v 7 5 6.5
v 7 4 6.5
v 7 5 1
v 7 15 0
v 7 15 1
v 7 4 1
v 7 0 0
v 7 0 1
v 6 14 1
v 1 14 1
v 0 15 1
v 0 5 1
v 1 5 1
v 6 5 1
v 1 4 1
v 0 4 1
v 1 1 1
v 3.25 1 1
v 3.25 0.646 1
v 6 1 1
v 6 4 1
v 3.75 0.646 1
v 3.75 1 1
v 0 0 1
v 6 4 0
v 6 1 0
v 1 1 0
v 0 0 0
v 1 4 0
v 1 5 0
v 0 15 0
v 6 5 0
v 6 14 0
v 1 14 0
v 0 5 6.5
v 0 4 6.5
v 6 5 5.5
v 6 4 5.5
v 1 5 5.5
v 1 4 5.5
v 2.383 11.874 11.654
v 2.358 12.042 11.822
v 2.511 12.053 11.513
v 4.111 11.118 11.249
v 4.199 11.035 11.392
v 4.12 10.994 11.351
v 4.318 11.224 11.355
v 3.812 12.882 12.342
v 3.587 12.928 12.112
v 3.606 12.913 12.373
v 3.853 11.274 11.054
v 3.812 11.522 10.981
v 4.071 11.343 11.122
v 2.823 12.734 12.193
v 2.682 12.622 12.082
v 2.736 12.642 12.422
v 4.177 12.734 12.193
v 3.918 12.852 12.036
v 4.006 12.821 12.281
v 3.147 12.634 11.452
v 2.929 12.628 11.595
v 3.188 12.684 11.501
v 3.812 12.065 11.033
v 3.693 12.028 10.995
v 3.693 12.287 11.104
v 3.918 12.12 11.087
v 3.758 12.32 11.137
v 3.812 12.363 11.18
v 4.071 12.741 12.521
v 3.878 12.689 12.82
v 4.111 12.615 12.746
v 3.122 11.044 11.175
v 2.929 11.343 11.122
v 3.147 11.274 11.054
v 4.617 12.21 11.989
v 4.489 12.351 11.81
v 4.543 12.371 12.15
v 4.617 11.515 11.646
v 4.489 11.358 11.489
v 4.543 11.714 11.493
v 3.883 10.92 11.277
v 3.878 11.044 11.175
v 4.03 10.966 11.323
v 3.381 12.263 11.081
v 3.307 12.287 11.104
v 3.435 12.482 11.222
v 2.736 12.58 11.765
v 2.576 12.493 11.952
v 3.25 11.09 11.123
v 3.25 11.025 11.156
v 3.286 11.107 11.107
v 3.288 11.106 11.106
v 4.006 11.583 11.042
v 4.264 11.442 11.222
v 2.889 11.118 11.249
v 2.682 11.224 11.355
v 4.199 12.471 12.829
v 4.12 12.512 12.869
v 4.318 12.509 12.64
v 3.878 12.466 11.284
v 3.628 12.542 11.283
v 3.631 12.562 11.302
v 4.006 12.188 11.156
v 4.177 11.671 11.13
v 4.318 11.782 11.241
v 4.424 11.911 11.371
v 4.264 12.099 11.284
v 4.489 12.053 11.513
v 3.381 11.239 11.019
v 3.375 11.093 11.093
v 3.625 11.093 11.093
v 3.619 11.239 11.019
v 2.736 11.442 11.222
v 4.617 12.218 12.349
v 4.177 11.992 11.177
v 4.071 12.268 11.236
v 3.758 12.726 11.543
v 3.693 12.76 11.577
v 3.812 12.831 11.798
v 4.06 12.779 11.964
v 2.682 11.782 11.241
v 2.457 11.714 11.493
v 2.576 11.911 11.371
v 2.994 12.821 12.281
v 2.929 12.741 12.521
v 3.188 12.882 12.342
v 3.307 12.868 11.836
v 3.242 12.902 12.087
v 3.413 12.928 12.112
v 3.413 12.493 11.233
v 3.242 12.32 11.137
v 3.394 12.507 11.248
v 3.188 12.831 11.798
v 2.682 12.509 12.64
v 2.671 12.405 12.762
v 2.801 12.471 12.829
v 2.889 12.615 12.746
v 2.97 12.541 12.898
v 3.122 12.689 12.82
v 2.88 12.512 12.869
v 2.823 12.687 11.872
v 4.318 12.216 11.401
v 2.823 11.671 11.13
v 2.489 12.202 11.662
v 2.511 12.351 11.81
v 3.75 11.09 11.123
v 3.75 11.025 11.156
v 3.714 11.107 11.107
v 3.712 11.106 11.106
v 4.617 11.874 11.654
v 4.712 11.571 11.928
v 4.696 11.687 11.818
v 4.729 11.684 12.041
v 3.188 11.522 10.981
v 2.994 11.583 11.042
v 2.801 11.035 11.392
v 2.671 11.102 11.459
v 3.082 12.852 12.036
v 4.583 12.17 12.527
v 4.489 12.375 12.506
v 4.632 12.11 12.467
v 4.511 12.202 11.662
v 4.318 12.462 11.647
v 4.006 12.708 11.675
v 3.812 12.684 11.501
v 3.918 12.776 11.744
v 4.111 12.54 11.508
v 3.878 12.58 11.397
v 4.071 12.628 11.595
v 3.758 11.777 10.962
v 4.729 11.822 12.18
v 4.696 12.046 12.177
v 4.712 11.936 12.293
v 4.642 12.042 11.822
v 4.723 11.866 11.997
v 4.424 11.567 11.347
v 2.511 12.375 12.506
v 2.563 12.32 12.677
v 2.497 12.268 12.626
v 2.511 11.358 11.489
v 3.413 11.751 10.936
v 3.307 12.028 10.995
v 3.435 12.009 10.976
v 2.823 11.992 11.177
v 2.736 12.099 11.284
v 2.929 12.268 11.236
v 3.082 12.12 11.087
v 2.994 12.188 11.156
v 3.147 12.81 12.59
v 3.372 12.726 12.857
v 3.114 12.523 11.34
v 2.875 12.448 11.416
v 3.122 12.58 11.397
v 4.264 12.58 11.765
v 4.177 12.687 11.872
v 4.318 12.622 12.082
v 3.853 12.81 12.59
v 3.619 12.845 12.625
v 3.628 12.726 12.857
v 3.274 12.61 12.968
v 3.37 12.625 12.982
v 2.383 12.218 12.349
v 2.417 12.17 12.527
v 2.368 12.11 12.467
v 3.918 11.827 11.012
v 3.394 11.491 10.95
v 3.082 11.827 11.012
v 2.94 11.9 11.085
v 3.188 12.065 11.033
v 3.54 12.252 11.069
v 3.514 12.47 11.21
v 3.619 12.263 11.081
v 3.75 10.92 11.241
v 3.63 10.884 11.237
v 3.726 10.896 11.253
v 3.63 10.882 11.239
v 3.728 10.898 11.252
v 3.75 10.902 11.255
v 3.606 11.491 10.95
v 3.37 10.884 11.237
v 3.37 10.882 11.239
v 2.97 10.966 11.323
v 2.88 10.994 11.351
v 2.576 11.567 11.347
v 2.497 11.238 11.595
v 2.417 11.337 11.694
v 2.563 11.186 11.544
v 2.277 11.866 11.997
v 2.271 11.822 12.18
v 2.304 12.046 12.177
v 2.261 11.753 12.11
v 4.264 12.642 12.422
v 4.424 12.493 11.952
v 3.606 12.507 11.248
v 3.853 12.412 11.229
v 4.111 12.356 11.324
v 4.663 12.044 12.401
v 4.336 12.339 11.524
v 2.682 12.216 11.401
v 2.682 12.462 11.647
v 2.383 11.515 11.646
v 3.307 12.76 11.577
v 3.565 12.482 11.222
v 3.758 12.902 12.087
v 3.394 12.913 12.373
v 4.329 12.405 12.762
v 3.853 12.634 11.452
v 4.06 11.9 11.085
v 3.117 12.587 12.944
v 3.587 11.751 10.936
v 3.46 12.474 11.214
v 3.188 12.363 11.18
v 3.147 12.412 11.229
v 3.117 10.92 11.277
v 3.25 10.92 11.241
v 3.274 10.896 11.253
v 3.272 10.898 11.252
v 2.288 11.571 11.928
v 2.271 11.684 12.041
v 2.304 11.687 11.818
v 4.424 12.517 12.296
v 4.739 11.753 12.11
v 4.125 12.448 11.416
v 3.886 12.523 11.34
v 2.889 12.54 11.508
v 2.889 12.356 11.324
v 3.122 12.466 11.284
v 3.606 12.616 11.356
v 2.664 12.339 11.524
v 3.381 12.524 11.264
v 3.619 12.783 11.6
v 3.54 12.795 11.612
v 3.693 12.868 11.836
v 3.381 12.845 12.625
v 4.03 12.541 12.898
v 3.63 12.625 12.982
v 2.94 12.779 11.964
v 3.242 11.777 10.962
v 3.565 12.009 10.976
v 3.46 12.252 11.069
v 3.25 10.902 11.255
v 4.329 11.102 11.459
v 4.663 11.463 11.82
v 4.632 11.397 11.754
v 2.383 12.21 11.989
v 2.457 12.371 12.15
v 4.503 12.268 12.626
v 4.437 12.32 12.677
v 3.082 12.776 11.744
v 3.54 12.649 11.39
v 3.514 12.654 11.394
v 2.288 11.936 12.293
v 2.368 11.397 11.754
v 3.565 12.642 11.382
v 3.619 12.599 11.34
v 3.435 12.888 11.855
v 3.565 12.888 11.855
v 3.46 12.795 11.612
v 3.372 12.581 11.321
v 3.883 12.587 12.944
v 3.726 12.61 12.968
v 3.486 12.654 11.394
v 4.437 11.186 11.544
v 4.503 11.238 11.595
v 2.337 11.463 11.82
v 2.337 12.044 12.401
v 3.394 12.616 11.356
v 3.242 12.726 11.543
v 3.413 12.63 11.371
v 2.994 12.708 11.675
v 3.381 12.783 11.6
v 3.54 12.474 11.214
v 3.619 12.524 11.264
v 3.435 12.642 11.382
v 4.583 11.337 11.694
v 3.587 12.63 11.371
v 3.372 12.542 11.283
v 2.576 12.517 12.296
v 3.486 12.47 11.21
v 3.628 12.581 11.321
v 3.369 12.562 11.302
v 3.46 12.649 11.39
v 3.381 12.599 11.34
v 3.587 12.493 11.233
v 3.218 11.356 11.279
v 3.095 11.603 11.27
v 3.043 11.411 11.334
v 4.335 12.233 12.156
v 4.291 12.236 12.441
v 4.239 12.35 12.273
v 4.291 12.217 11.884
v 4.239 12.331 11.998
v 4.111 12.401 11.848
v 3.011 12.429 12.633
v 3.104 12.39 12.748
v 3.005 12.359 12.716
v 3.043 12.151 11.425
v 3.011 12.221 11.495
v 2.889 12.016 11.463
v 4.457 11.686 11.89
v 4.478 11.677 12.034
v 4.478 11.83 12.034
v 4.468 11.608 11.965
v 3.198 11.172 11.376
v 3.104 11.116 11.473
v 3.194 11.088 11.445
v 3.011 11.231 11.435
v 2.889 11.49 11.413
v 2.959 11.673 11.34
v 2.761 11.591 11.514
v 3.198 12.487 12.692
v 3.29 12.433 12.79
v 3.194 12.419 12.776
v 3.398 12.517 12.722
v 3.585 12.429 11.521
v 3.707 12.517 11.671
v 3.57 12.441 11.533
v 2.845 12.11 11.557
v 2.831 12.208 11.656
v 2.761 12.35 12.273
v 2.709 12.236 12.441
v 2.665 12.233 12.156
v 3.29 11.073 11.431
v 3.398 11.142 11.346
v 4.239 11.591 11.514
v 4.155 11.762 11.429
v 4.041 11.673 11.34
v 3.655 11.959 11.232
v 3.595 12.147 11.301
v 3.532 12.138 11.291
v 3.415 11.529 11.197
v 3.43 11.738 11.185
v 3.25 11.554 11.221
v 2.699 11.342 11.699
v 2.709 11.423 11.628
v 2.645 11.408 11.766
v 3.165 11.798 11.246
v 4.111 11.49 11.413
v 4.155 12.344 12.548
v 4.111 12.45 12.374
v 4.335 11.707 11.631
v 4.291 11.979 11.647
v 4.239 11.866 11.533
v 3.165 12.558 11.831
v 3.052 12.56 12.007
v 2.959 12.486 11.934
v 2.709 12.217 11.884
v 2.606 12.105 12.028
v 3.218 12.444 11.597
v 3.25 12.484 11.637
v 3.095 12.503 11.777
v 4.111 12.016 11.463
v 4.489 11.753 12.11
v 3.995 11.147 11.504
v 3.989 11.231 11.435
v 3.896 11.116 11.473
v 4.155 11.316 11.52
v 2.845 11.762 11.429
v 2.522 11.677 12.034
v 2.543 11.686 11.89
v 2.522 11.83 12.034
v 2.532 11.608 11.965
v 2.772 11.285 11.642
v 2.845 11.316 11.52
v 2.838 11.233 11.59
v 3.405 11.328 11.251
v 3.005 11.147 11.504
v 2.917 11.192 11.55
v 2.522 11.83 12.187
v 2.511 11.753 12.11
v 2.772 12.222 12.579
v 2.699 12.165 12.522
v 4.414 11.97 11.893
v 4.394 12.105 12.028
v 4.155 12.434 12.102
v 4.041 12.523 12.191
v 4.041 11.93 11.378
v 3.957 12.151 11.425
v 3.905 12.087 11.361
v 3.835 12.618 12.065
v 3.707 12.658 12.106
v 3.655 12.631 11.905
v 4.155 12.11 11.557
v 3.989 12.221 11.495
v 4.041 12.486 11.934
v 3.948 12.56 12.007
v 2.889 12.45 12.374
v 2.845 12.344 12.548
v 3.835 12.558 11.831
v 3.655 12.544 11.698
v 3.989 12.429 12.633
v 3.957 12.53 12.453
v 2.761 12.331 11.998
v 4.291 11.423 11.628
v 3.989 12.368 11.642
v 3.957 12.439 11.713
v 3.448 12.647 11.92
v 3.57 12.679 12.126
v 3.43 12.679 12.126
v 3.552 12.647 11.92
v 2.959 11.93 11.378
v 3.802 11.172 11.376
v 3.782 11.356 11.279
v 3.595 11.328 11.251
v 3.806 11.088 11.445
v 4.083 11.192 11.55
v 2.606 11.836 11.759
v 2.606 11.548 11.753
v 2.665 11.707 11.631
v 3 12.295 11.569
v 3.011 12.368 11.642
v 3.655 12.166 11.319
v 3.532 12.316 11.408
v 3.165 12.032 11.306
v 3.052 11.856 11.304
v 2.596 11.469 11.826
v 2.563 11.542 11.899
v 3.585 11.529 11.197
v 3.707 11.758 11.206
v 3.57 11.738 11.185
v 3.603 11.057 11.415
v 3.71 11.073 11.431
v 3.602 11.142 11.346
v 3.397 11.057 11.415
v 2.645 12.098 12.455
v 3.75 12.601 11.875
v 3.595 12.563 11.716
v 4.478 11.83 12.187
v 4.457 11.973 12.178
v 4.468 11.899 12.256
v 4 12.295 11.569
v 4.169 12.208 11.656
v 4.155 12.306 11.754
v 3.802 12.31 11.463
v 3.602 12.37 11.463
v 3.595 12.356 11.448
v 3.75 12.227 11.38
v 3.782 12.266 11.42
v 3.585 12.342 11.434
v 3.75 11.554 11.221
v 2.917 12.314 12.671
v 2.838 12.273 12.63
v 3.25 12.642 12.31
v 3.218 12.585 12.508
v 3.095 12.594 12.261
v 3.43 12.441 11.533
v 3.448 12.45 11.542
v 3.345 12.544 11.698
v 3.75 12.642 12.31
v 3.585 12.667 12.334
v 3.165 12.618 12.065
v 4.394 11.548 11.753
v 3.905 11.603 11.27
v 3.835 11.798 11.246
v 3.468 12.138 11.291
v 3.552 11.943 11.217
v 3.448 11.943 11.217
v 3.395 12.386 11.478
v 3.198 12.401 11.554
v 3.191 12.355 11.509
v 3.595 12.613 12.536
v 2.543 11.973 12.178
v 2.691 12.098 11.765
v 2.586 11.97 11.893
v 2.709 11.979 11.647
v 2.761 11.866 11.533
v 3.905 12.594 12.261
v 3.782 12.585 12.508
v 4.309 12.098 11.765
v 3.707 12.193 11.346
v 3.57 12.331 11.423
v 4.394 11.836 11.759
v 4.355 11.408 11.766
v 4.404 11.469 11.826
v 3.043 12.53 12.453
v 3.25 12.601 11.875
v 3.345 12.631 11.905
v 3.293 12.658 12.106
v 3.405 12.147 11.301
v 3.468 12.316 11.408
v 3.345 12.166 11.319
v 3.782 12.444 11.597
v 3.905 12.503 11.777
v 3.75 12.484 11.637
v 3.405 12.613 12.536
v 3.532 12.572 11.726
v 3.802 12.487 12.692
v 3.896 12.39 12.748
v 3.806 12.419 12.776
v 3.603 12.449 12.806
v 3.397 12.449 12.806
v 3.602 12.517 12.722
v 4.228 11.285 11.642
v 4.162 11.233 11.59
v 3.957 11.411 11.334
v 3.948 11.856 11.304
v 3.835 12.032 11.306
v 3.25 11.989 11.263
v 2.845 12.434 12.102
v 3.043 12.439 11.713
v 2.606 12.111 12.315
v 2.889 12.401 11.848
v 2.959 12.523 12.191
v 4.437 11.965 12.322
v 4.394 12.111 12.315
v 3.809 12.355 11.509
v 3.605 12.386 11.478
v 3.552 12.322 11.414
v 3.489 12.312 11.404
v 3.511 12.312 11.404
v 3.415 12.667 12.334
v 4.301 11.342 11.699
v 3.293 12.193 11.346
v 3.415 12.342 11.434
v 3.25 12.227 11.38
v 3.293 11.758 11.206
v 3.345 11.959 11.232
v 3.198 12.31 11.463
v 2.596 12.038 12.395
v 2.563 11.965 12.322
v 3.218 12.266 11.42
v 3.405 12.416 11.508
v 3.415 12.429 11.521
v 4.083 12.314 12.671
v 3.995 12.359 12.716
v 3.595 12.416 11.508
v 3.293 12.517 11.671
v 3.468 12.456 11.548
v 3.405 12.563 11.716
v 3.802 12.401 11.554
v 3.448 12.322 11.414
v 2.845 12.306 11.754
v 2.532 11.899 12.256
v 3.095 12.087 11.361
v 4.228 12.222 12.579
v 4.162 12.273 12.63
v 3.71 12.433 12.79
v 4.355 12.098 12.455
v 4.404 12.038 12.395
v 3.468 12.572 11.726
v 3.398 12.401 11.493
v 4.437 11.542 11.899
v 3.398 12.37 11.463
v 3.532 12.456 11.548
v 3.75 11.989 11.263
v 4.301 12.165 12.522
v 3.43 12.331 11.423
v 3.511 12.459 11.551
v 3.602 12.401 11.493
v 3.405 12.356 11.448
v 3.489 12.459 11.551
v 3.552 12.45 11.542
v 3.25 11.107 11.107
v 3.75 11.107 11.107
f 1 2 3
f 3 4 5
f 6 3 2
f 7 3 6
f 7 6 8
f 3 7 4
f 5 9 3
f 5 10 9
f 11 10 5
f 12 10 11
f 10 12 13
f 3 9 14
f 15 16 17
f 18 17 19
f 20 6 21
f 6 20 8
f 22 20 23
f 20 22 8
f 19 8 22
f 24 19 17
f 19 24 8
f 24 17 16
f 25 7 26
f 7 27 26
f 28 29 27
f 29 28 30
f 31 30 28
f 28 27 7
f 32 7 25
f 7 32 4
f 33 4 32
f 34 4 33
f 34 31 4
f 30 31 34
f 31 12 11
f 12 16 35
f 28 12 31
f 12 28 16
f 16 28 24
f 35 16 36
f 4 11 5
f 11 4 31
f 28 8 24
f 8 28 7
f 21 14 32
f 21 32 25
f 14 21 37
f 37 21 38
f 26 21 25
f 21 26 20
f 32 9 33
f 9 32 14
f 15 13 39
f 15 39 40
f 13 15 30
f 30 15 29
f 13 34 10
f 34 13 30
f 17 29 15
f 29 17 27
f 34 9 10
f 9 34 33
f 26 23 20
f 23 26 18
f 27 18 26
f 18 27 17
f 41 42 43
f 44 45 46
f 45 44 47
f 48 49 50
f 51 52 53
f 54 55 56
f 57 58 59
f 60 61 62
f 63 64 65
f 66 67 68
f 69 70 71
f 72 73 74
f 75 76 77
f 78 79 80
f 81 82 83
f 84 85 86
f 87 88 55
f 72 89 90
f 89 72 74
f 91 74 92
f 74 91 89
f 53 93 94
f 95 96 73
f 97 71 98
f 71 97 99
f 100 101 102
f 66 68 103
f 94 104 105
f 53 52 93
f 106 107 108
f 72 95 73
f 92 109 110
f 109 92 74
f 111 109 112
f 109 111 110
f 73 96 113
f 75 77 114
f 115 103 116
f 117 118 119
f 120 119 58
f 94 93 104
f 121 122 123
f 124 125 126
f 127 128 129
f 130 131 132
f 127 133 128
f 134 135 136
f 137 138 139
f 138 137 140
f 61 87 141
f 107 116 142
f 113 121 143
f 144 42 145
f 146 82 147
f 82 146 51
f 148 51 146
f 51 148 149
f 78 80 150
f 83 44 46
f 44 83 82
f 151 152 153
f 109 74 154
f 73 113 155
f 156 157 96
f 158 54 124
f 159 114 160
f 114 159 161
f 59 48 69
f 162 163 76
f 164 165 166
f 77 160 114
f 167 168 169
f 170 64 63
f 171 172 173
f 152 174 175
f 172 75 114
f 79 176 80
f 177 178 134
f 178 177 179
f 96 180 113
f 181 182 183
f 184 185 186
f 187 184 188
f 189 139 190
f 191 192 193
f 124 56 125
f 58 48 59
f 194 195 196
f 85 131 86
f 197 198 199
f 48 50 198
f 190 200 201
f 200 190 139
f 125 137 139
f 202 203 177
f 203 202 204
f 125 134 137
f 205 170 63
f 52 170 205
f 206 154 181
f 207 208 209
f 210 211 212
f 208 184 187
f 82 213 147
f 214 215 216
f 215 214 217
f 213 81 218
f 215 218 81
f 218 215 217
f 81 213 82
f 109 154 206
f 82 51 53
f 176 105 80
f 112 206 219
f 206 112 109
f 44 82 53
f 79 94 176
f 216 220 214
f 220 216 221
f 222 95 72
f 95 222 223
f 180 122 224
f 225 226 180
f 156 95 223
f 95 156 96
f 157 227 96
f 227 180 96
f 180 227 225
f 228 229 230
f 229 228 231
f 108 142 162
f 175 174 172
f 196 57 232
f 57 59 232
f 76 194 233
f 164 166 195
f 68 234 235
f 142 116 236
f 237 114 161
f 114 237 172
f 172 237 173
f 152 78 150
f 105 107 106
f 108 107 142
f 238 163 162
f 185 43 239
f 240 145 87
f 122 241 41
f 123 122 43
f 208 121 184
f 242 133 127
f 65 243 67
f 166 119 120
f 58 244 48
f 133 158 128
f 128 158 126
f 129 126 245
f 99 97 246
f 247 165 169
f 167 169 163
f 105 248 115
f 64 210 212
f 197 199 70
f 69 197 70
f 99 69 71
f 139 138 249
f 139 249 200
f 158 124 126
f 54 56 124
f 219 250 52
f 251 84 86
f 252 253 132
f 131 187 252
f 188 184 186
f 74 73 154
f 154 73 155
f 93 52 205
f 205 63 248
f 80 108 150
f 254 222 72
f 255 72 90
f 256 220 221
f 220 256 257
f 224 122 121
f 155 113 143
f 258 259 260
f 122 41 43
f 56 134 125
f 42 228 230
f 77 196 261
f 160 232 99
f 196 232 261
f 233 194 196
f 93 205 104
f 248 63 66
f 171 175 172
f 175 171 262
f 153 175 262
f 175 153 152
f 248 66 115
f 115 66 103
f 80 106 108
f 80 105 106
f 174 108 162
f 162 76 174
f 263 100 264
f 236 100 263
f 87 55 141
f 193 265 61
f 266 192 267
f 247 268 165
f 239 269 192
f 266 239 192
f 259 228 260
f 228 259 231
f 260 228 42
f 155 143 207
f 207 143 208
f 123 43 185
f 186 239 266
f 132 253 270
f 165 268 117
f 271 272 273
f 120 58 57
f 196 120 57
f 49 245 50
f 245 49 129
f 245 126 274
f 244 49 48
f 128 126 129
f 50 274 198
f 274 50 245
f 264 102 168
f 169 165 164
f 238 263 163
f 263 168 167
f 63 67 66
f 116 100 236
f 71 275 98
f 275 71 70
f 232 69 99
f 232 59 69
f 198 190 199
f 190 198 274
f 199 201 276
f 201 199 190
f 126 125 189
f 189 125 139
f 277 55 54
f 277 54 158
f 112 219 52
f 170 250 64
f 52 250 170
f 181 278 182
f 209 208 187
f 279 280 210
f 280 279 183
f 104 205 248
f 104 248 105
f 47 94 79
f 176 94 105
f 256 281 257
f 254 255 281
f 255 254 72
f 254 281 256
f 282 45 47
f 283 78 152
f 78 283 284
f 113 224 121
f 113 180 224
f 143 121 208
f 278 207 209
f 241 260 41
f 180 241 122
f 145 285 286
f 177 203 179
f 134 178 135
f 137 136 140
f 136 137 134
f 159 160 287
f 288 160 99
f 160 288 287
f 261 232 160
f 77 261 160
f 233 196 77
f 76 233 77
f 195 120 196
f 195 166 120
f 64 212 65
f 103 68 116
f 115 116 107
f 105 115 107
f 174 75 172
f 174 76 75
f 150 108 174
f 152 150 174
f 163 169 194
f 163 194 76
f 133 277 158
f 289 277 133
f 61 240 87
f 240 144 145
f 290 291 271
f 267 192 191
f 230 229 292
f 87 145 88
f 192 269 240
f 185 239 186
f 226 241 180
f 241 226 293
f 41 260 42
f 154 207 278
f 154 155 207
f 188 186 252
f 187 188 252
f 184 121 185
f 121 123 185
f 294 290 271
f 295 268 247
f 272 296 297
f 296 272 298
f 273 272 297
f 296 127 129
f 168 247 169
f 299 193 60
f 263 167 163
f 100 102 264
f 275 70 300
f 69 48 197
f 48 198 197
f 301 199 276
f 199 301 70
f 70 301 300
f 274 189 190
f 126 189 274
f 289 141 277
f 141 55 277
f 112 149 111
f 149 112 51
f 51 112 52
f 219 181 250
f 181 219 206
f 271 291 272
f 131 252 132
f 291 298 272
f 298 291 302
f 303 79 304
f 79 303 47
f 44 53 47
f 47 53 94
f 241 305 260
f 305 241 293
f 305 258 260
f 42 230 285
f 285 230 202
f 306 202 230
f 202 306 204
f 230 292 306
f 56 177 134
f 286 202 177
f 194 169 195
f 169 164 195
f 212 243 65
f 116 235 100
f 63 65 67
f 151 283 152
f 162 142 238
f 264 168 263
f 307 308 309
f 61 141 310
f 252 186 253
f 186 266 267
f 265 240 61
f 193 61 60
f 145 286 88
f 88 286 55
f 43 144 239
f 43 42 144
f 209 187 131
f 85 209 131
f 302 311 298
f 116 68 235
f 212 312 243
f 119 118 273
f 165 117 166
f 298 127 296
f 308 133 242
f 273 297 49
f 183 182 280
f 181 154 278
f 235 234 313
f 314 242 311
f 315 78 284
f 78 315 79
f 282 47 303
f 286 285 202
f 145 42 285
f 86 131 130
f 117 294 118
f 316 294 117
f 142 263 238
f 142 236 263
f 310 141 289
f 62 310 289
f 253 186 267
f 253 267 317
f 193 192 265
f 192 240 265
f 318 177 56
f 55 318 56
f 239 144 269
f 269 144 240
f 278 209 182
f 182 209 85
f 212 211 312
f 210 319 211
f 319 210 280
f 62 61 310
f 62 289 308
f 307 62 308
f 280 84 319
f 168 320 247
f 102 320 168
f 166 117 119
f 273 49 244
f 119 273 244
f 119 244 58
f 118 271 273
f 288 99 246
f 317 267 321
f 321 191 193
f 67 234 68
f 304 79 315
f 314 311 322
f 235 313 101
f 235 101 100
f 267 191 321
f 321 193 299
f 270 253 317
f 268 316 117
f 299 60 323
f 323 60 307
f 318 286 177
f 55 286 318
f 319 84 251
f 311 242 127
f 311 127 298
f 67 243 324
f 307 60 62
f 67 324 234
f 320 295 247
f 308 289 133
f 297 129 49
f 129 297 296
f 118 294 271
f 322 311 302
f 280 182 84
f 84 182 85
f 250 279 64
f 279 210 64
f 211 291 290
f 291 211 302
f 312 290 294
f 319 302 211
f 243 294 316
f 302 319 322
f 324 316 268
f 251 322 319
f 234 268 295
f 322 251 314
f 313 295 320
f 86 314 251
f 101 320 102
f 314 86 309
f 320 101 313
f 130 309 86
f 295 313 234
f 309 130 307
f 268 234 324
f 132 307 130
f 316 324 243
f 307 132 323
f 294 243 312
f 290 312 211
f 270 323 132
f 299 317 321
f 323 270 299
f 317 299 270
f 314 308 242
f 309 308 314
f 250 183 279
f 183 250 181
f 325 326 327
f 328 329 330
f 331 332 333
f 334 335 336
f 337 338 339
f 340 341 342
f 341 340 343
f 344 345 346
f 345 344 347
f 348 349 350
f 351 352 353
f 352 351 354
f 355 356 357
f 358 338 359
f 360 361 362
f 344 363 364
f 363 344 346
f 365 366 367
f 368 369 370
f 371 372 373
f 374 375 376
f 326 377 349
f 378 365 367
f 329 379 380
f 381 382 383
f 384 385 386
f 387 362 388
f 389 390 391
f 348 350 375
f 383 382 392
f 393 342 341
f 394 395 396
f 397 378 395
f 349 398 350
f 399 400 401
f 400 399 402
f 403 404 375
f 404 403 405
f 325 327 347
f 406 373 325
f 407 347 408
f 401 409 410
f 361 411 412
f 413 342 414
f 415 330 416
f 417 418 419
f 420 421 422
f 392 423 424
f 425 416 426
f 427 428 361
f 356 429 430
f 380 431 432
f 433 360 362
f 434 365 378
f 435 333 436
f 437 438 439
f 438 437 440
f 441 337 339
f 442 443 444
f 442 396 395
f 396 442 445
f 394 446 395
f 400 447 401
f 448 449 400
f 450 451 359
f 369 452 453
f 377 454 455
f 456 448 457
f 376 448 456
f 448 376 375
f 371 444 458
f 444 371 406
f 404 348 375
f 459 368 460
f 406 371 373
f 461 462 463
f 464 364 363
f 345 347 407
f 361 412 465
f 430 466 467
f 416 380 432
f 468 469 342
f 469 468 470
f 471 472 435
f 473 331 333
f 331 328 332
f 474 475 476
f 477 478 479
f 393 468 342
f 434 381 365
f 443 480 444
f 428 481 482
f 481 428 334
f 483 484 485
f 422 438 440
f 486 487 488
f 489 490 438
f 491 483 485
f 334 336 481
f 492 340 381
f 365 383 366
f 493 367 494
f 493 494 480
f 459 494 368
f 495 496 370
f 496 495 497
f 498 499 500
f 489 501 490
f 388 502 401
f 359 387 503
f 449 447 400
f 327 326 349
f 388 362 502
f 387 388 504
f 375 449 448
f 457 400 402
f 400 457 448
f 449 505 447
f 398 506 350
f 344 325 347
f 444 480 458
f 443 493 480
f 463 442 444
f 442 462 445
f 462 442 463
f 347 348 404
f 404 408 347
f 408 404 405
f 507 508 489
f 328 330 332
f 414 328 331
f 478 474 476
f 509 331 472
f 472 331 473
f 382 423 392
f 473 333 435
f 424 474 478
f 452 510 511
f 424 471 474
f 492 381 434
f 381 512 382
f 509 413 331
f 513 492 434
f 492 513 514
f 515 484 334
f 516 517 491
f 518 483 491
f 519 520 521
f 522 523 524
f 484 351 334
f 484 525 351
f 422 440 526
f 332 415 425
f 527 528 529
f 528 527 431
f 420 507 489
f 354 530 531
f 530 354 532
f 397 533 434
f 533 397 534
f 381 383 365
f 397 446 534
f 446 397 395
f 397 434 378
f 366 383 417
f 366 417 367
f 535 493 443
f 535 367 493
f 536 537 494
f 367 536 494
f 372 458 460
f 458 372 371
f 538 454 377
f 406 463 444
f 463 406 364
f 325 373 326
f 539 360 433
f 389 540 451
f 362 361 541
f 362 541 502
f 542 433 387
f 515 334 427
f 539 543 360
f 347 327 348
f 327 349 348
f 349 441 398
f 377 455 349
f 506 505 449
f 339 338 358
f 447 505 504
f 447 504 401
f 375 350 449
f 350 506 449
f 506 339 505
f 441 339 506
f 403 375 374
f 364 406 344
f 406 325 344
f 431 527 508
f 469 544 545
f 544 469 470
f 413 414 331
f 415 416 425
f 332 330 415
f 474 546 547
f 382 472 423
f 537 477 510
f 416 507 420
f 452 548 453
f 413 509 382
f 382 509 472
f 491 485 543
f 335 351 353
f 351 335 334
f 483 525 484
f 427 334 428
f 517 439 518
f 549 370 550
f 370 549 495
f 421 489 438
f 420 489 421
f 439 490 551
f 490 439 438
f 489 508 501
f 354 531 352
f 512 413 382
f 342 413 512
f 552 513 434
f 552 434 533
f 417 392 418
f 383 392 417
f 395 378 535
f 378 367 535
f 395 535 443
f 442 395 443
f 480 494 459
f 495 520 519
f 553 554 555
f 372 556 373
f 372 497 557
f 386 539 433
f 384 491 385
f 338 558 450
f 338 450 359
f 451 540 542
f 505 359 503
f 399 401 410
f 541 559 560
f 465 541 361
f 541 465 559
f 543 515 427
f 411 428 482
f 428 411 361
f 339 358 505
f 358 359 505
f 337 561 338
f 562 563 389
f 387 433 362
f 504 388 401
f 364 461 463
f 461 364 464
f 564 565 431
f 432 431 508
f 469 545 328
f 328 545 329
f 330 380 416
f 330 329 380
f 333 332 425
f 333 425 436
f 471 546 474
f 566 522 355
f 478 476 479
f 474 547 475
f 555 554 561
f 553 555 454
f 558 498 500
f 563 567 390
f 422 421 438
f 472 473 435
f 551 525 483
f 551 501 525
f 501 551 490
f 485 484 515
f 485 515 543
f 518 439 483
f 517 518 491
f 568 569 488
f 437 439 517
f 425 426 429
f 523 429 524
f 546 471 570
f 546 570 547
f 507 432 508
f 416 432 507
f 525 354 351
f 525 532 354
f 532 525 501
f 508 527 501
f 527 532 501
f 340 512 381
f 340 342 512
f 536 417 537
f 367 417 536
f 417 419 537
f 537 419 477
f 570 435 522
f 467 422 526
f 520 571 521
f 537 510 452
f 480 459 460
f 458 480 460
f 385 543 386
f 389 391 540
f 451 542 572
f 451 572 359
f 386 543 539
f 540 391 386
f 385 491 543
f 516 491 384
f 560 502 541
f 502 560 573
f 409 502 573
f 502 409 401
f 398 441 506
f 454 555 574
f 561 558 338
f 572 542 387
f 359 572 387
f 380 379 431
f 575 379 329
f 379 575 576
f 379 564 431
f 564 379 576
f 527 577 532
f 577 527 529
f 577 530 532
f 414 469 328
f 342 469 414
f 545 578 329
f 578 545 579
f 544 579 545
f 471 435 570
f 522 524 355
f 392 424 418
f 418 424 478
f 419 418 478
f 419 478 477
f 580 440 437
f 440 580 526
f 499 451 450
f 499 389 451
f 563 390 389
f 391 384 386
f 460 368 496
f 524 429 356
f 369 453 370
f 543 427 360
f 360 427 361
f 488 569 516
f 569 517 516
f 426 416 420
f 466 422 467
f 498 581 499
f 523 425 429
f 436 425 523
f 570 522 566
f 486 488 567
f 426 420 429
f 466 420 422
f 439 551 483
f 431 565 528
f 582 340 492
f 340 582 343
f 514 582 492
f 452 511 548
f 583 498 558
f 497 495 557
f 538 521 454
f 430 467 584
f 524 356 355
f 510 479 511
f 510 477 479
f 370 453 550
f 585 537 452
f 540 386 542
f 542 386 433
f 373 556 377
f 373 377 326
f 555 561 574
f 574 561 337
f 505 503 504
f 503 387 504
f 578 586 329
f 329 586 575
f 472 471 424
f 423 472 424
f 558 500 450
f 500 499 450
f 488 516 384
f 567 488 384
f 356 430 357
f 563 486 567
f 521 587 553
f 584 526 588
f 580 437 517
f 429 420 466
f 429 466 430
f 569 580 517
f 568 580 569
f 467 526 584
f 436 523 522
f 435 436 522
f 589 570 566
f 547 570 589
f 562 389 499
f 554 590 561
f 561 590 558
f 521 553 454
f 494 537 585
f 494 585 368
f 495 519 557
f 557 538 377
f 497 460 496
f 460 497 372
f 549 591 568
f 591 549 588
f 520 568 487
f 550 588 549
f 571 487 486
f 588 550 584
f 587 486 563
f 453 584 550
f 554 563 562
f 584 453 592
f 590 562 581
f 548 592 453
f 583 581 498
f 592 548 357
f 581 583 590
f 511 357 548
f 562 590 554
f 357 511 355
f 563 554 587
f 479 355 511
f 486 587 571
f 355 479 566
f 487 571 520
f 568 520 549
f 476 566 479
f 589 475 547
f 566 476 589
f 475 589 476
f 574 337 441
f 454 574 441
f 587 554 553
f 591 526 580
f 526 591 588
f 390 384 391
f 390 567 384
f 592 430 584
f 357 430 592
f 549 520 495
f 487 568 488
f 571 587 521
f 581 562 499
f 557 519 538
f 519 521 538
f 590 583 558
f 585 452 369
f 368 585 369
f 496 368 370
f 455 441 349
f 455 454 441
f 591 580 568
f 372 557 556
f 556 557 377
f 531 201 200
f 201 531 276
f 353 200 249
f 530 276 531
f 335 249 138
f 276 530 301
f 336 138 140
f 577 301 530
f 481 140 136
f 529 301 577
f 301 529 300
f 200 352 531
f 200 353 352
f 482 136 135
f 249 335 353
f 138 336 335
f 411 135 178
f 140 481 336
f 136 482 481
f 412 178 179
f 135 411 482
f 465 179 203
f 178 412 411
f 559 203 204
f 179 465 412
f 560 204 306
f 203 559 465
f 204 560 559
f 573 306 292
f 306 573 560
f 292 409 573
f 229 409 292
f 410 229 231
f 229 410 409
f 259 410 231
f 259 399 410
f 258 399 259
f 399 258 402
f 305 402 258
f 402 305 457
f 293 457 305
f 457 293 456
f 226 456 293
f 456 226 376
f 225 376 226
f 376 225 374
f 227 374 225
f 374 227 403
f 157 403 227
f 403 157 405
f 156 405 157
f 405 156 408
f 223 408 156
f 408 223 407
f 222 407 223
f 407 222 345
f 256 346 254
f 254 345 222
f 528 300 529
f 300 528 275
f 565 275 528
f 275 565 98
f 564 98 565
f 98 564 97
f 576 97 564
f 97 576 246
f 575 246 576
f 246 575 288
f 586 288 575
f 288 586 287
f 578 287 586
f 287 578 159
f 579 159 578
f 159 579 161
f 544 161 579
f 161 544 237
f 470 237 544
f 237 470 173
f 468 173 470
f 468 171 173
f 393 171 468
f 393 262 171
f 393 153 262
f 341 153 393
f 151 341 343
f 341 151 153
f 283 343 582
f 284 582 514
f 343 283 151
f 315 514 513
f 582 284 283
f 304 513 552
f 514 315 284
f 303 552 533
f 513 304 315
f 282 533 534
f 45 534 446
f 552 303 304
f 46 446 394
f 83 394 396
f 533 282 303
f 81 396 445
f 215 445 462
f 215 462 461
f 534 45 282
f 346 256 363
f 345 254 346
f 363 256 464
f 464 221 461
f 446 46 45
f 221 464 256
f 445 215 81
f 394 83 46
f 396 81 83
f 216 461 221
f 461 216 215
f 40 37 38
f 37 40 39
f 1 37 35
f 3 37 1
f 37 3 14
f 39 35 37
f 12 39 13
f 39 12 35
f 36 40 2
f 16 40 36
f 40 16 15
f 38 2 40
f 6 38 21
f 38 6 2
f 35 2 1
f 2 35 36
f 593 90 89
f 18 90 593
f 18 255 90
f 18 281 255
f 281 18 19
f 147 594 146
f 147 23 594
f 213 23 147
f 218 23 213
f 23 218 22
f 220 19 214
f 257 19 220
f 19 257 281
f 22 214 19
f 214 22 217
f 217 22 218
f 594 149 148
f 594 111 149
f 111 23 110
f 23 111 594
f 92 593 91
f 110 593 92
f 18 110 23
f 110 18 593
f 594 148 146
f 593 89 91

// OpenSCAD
// model of a catapult with as many customizable parameters as possible to allow for various trajectory experiments in a physics demo

//************************************************************
//PARAMETERS
//************************************************************
// Base width
baseWidth = 7; //[5:30]
// Base length
baseLength = 15; //[5:30]
// Base height
baseHeight = 1; //[0.5:1]
// Base thickness
baseThick = 1; //[0.5:1]
// Arm length
armLength = 15; //[5:50]
// Arm width
armWidth = 0.5; //[0.25:3]
// Arm thickness
armThick = 0.25; //[0.25:1]
// Arm angle
angle = 45; //[5:90]
// Radius of bucket
bucketRad = 1; //[0.25:10]
// Bucket thickness
bucketThick = 0.25; //[0.25:1]
// Crossbar height (set to 0 if you don't want a crossbar)
barHeight = 5.5; //[0:40]
// Crossbar distance from front
barY = 4; //[0:20]
// Front support length (may be needed to prevent front flips)
suppLength = 0; //[0:15]

//************************************************************
//MATH
//************************************************************
holeWidth = baseWidth - (2*baseThick);
holeLength = baseLength - (2*baseThick);
holeHeight = baseHeight + 2;

armX = (baseWidth - armWidth)/2;
armY = baseThick/2;
armZ = baseHeight/2;

bucketX = baseWidth/2;
bucketY = ((baseThick/2) + ((armLength + bucketRad + bucketThick - armThick)*cos(angle)) - (armThick*sin(angle))) * 1.01;
bucketZ = ((baseHeight/2) + ((armLength + bucketRad + bucketThick - armThick)*sin(angle)) + (armThick*cos(angle))) * 1.01;

//************************************************************
//RENDERS
//************************************************************
$fn = 30;

// translate cube up to x-y plane to make printers happy
//translate([0,0,baseHeight/2]){
	catapult();
//}

//************************************************************
//MODULES
//************************************************************
module catapult(){
    union(){
        base();
        arm();
        bucket();
        if(barHeight != 0){
            crossbar();
        }
        if(suppLength != 0){
            support();
        }
    }
}

module base(){
    difference(){
        cube([baseWidth,baseLength,baseHeight],false);
        translate([baseThick,baseThick,-1]){
            cube([holeWidth,holeLength,holeHeight],false);        
        }
    }
}

module arm(){
    translate([armX,armY,armZ]){
        rotate([angle,0,0]){
            cube([armWidth,armLength,armThick],false);
        }
    }
}

module bucket(){
    translate([bucketX,bucketY,bucketZ]){
        rotate([angle,0,0]){
            translate([0,0,bucketRad*0.1]){
                difference(){
                    sphere(bucketRad+bucketThick);
                    sphere(bucketRad);
                    translate([0,0,(bucketRad*1.5)-(bucketRad*0.1)]){
                        cube([(bucketRad+1)*3,(bucketRad+1)*3,bucketRad*3],true);
                    }
                }
            }
        }
    }
}

module crossbar(){
    translate([0,barY,0]){
        cube([baseThick,baseThick,barHeight]);
    }
    translate([baseWidth-baseThick,barY,0]){
        cube([baseThick,baseThick,barHeight]);
    }
    translate([0,barY,barHeight]){
        cube([baseWidth,baseThick,baseThick]);
    }
}

module support(){
    translate([0,-suppLength,0]){
        cube([baseThick,suppLength,baseHeight]);
    }
    translate([baseWidth-baseThick,-suppLength,0]){
        cube([baseThick,suppLength,baseHeight]);
    }
}
